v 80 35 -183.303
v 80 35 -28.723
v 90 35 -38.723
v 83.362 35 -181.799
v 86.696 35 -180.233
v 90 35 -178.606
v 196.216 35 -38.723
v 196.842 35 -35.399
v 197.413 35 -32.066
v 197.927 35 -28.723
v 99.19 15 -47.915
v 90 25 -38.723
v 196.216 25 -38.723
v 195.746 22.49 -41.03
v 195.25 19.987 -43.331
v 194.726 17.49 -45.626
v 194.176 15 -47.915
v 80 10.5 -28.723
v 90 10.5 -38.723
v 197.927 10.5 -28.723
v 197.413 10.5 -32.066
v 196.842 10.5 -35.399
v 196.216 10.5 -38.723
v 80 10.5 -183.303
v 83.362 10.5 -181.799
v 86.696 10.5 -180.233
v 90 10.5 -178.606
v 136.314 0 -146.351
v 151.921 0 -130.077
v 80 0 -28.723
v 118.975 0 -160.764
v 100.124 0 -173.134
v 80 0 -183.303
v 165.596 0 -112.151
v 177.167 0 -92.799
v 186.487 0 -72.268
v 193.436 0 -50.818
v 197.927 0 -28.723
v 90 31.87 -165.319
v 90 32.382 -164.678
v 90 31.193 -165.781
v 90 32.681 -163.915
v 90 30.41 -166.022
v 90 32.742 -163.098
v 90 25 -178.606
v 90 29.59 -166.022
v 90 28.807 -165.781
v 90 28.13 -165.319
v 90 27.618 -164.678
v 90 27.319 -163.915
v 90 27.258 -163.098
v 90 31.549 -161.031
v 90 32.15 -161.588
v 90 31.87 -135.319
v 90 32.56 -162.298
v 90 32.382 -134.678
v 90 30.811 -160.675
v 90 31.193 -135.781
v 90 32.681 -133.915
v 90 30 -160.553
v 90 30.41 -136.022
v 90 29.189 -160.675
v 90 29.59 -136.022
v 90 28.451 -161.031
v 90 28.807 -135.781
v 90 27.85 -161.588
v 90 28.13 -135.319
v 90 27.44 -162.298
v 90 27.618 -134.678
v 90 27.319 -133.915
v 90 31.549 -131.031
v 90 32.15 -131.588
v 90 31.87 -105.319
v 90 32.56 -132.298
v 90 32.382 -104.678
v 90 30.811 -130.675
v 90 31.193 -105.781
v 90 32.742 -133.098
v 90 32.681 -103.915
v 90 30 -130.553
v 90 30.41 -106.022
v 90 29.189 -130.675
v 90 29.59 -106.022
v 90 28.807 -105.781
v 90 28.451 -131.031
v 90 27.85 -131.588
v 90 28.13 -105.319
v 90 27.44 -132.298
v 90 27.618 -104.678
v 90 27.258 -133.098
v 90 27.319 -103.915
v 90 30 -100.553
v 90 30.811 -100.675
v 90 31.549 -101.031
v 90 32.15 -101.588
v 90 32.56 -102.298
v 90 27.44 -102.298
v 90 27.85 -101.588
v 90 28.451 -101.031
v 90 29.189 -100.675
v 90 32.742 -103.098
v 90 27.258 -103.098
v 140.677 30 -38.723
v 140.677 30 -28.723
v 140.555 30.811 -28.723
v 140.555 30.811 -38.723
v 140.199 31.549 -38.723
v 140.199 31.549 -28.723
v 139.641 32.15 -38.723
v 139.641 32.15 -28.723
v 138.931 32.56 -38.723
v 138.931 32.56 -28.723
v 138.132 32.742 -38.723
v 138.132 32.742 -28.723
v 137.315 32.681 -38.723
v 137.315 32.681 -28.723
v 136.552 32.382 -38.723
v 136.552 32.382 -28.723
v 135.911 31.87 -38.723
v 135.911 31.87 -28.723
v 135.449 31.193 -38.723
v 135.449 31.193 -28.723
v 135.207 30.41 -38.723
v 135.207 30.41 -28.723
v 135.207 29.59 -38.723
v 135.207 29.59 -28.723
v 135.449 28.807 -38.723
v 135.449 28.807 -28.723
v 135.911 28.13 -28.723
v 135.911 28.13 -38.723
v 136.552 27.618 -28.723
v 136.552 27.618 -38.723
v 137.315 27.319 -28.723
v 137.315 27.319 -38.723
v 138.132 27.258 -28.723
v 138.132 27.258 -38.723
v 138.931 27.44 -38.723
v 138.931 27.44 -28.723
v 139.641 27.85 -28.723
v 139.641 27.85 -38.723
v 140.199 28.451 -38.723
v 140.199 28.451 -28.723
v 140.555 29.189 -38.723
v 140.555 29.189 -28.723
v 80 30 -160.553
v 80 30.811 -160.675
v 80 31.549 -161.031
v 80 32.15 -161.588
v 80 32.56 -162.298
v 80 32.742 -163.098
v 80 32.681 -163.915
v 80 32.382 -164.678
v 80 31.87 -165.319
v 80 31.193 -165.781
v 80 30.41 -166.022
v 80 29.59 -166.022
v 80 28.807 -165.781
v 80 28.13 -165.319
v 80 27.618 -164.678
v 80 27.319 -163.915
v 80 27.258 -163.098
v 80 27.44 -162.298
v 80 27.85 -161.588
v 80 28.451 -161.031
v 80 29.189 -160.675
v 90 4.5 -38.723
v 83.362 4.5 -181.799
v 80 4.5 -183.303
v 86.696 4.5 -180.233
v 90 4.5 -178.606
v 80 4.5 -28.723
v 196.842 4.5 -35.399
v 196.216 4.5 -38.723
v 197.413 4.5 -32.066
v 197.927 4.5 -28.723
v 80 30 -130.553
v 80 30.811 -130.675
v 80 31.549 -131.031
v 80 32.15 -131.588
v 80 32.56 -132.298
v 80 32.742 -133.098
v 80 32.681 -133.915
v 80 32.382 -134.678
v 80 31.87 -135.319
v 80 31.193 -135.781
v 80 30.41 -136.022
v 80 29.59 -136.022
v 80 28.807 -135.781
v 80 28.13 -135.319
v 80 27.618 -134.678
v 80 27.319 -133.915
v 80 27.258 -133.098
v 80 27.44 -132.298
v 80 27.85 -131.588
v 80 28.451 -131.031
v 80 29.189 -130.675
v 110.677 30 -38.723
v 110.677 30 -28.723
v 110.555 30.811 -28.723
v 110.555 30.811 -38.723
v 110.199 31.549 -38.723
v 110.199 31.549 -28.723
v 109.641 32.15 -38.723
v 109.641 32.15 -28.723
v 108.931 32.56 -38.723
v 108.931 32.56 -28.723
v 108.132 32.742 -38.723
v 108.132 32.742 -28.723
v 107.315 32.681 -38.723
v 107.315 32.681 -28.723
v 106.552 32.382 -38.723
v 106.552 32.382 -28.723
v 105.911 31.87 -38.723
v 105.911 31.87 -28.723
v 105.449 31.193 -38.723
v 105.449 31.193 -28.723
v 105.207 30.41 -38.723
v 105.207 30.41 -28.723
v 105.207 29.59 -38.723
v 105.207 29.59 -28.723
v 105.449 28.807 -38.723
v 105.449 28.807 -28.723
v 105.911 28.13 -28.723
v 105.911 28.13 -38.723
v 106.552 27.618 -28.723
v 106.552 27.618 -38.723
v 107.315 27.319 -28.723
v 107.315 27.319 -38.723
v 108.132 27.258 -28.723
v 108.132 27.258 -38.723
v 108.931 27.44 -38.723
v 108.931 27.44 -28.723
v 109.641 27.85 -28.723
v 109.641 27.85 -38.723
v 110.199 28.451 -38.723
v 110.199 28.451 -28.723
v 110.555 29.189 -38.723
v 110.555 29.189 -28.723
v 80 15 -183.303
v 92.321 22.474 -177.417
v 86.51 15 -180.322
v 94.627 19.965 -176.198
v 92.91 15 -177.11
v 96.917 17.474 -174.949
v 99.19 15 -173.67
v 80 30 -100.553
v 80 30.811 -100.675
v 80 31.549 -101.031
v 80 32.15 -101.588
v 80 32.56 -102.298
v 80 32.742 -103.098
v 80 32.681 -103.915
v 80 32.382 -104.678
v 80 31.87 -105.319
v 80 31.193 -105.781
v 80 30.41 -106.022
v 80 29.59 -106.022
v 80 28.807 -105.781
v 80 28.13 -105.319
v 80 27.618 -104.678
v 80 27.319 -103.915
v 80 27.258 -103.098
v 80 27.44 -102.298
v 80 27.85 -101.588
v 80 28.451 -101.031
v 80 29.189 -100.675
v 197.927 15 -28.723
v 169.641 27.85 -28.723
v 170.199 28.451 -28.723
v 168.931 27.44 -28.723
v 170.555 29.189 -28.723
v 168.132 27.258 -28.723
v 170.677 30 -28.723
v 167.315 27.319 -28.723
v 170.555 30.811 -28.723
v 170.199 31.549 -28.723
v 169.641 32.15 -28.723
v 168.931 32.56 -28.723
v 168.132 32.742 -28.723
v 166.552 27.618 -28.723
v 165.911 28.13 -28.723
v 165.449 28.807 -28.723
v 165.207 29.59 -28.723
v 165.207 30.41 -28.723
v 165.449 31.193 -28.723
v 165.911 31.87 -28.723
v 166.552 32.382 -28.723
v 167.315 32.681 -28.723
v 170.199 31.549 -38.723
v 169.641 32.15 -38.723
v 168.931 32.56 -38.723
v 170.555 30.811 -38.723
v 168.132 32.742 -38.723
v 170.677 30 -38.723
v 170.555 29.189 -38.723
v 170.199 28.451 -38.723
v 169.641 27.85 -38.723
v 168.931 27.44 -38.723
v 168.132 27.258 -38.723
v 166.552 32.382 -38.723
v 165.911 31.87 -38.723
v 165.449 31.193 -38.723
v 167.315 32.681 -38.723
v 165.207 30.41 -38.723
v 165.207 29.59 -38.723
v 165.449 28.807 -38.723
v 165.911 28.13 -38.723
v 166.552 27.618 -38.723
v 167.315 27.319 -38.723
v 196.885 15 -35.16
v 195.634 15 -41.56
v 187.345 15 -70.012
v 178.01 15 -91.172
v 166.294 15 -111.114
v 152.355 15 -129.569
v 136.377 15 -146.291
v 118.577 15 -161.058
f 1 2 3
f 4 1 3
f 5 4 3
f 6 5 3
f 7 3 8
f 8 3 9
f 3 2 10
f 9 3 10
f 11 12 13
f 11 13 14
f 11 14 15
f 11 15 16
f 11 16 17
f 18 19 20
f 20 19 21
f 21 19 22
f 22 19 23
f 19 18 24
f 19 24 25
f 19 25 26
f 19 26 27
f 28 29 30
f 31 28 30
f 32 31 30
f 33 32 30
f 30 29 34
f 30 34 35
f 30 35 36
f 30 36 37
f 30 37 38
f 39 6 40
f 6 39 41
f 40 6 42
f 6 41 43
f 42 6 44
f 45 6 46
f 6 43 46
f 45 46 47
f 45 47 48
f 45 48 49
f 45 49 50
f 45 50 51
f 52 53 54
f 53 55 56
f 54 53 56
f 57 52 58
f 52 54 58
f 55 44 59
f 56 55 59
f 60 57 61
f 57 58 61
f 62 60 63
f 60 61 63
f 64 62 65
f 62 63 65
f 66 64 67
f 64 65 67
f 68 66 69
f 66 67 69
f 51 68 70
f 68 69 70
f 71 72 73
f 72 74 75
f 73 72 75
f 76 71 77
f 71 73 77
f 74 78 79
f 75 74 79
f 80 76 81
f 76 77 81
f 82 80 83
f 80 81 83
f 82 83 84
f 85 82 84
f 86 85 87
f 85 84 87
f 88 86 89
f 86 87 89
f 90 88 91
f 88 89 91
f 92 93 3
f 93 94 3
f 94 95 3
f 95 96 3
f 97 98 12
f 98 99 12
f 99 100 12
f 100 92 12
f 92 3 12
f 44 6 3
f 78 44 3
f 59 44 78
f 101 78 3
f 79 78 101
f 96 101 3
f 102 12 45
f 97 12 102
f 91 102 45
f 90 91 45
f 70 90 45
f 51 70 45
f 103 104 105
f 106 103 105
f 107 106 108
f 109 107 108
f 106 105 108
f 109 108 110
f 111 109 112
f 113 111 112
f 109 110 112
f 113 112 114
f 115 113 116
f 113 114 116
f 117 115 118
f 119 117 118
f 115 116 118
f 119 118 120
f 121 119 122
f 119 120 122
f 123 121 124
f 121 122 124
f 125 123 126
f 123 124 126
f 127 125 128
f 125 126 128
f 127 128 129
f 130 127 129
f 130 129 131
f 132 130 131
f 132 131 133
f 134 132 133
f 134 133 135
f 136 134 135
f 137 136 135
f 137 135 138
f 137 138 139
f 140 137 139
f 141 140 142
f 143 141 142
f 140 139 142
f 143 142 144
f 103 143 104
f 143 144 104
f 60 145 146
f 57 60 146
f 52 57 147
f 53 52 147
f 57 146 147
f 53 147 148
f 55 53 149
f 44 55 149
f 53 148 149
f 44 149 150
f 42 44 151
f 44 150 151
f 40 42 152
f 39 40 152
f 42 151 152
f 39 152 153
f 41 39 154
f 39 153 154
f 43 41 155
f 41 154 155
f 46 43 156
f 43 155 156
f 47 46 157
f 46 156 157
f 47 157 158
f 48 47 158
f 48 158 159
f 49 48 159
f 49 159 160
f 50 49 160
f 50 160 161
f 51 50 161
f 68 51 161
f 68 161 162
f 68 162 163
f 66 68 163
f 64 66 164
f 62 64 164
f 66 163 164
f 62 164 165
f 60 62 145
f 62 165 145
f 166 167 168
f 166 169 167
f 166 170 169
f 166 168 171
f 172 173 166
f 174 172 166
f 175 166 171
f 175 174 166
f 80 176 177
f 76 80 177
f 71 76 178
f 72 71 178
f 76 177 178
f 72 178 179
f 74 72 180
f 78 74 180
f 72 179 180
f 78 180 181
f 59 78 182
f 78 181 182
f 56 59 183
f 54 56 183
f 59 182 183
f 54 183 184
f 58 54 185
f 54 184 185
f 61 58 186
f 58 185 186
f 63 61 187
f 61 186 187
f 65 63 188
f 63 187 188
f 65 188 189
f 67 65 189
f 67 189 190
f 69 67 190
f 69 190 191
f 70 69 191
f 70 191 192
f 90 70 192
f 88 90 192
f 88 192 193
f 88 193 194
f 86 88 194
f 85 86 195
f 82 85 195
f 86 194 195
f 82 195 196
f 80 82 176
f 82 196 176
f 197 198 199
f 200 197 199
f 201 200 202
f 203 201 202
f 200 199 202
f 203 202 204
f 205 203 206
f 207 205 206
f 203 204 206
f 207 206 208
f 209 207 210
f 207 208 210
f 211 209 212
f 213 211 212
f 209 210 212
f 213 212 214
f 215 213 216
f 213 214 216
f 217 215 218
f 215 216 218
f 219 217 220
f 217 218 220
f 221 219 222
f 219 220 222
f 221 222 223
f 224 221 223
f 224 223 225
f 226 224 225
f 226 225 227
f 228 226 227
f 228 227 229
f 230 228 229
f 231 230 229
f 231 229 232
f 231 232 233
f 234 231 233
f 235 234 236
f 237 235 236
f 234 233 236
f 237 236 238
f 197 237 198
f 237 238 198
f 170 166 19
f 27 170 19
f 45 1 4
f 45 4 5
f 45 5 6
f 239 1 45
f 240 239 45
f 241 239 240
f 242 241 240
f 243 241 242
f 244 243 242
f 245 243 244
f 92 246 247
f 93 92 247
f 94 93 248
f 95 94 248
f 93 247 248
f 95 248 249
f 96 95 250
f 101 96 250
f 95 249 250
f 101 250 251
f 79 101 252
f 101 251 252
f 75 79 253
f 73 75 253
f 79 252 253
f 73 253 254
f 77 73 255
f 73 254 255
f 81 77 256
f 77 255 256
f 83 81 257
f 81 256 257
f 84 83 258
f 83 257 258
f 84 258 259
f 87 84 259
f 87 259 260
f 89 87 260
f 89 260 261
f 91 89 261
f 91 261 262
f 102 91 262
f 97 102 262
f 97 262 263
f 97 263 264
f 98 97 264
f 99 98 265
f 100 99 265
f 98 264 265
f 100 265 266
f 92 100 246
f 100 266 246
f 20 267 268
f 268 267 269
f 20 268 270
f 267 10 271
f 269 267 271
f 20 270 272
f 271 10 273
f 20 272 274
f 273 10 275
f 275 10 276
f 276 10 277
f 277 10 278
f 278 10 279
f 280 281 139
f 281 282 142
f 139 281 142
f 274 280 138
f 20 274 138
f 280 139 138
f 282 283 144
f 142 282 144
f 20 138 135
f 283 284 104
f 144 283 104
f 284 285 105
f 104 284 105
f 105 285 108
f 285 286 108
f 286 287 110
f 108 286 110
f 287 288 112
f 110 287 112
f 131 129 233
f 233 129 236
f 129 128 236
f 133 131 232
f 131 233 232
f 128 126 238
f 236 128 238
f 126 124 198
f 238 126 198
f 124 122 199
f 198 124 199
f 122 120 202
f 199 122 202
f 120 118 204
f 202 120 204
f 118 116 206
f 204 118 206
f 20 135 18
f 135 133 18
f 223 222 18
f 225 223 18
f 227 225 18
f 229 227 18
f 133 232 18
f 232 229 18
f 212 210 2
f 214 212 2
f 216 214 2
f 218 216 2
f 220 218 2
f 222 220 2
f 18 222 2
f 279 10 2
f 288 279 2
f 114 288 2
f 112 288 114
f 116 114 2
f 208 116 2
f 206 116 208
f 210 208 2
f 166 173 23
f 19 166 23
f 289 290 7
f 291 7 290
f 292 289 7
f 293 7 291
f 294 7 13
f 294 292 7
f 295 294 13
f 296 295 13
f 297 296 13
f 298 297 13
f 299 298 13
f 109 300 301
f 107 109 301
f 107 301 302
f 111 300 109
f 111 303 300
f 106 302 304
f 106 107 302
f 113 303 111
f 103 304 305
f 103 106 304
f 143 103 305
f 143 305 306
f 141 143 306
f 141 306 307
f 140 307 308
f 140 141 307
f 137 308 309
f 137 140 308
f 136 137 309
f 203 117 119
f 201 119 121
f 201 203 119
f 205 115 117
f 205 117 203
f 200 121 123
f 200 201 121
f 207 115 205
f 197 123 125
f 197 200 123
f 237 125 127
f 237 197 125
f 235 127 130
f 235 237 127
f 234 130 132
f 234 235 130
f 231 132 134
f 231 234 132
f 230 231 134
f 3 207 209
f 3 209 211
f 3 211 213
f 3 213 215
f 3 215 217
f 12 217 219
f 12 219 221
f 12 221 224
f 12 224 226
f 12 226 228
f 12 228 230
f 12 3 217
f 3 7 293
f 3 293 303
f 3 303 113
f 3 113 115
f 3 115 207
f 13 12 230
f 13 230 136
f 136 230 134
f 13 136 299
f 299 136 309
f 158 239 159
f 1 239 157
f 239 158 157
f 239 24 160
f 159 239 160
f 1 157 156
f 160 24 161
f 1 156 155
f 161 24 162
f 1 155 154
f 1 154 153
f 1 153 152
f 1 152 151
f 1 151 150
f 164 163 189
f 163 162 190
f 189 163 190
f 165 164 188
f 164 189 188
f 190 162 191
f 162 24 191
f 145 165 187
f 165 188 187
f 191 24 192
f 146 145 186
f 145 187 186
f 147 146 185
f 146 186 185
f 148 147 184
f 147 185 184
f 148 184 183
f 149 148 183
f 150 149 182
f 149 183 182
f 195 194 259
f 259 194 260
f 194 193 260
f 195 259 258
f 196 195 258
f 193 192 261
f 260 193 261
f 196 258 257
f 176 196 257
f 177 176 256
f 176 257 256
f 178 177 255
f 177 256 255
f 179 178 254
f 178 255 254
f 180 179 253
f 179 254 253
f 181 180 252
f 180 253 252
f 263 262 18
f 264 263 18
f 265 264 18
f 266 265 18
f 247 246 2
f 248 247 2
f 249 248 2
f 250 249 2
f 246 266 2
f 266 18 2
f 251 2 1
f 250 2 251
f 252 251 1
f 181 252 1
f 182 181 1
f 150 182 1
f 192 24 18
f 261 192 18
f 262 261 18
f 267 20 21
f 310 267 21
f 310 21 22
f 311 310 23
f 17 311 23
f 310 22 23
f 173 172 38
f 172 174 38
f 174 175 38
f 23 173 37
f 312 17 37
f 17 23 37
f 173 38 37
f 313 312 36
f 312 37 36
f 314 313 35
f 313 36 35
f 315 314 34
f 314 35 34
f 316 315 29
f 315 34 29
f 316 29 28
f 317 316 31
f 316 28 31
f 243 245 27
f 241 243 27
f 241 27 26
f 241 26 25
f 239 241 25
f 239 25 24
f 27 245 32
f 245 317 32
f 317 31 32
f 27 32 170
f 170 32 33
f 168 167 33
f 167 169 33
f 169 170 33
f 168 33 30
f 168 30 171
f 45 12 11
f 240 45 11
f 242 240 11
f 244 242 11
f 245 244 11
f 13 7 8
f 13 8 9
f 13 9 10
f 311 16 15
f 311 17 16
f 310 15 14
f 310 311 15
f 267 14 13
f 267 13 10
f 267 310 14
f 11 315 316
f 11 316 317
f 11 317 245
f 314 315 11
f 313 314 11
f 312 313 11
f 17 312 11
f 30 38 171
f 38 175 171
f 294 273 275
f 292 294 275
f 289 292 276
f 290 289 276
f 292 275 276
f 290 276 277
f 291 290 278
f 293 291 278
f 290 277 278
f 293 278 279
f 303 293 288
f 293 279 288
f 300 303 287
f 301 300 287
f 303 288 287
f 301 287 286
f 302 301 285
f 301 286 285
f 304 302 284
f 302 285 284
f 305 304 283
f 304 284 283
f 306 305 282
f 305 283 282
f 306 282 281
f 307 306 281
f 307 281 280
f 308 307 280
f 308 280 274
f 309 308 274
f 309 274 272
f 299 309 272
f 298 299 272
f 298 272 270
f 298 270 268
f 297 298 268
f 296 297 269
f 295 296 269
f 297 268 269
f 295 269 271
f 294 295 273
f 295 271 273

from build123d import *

# Parameters (mm, degrees)
SKETCH1_R                = 200
BOSS_EXTRUDE1_DEPTH      = 15
BOSS_EXTRUDE2_DEPTH      = 200
CUT_EXTRUDE1_DEPTH       = 286.087705803
CUT_EXTRUDE1_DEPTH_BACK  = 286.087705803
SKETCH3_R                = 85
CUT_EXTRUDE2_DEPTH       = 451.079120005
CUT_EXTRUDE2_DEPTH_BACK  = 451.079120005
SKETCH4_R                = 11
CUT_EXTRUDE3_DEPTH       = 451.079120105
CUT_EXTRUDE3_DEPTH_BACK  = 110
CUT_EXTRUDE4_DEPTH       = 110
BOSS_EXTRUDE3_DEPTH      = 200
CUT_EXTRUDE5_DEPTH       = 286.087705815
CUT_EXTRUDE5_DEPTH_BACK  = 286.087705815
SKETCH7_OUTSIDE_W        = 515.59
SKETCH7_OUTSIDE_H        = 515.59
SKETCH7_OUTSIDE_R        = 200
SKETCH9_R                = 4
BOSS_EXTRUDE4_DEPTH      = 220
CUT_EXTRUDE6_DEPTH       = 190
SKETCH11_R               = 3
CUT_EXTRUDE7_DEPTH       = 486.974499745
CUT_EXTRUDE8_DEPTH       = 300.457843596
CUT_EXTRUDE8_DEPTH_BACK  = 300.457843596
SKETCH12_OUTSIDE_W       = 561.36
SKETCH12_OUTSIDE_H       = 521.36
BOSS_EXTRUDE5_DEPTH      = 160
BOSS_EXTRUDE6_DEPTH      = 160
CUT_EXTRUDE9_START       = 15
CUT_EXTRUDE9_DEPTH       = 20
CUT_EXTRUDE10_DEPTH      = 254.564671702
CUT_EXTRUDE10_DEPTH_BACK = 254.564671702
SKETCH17_W               = 10
SKETCH17_H               = 6
CUT_EXTRUDE11_DEPTH      = 221.752620232
CUT_EXTRUDE11_DEPTH_BACK = 221.752620232
SKETCH18_W               = 10
SKETCH18_H               = 6
SKETCH19_R               = 2.75
CUT_EXTRUDE12_DEPTH      = 10
SKETCH20_R               = 2.75
CUT_EXTRUDE13_DEPTH      = 10


# Read off the part's stored shape, not the designer's step: Cut-Extrude9
with BuildPart() as part:
    # Sketch1 → Boss-Extrude1 (new body)
    with BuildSketch(Plane(origin=(0, 0, 0), x_dir=(1, 0, 0), z_dir=(0, 1, 0))):
        with Locations(Location((0, 0, 0), (0, 0, 270))):
            Circle(SKETCH1_R)
    extrude(amount=BOSS_EXTRUDE1_DEPTH)

    # Sketch2 → Boss-Extrude2 (add, symmetric)
    with BuildSketch(Plane.XY):
        Polygon((-25, 50.707142143), (25, 50.707142143), (60, 15), (-60, 15), align=None)
    extrude(amount=BOSS_EXTRUDE2_DEPTH, both=True)

    # Sketch3 → Cut-Extrude1 (cut, two sides: drawn at the far end of the back side and taken through both)
    with BuildSketch(Plane(origin=(0, 15, 0), x_dir=(1, 0, 0), z_dir=(0, 1, 0)).offset(-CUT_EXTRUDE1_DEPTH_BACK)):
        with Locations(Location((0, 0, 0), (0, 0, 270))):
            Circle(SKETCH3_R)
    extrude(amount=CUT_EXTRUDE1_DEPTH + CUT_EXTRUDE1_DEPTH_BACK, mode=Mode.SUBTRACT)

    # Sketch4 → Cut-Extrude2 (cut, two sides: drawn at the far end of the back side and taken through both)
    with BuildSketch(Plane(origin=(0, 0, -200), x_dir=(-1, 0, 0), z_dir=(0, 0, -1)).offset(-CUT_EXTRUDE2_DEPTH_BACK)):
        with Locations((0, 29)):
            Circle(SKETCH4_R)
    extrude(amount=CUT_EXTRUDE2_DEPTH + CUT_EXTRUDE2_DEPTH_BACK, mode=Mode.SUBTRACT)

    # Sketch5 → Cut-Extrude3 (cut, two sides: drawn at the far end of the back side and taken through both)
    with BuildSketch(Plane.XY.offset(200).offset(-CUT_EXTRUDE3_DEPTH_BACK)):
        Polygon((-25, 50.707142143), (25, 50.707142143), (50.198039412, 25), (25, 25), (25, 15), (-25, 15), (-25, 25), (-50.198039412, 25), align=None)
    extrude(amount=CUT_EXTRUDE3_DEPTH + CUT_EXTRUDE3_DEPTH_BACK, mode=Mode.SUBTRACT)

    # Sketch6 → Cut-Extrude4 (cut)
    with BuildSketch(Plane(origin=(0, 0, -200), x_dir=(-1, 0, 0), z_dir=(0, 0, -1))):
        Polygon((-25, 50.707142143), (25, 50.707142143), (50.198039412, 25), (25, 25), (25, 15), (-25, 15), (-25, 25), (-50.198039412, 25), align=None)
    extrude(amount=-CUT_EXTRUDE4_DEPTH, mode=Mode.SUBTRACT)

    # Sketch8 → Boss-Extrude3 (add, symmetric)
    with BuildSketch(Plane(origin=(0, 0, 0), x_dir=(0, 0, -1), z_dir=(1, 0, 0))):
        Polygon((0, 15), (-20, 15), (-10, 35.712315177), (10, 35.712315177), (20, 15), align=None)
    extrude(amount=BOSS_EXTRUDE3_DEPTH, both=True)

    # Sketch7 outside → Cut-Extrude5 (cut, two sides: drawn at the far end of the back side and taken through both)
    with BuildSketch(Plane(origin=(0, 15, 0), x_dir=(1, 0, 0), z_dir=(0, 1, 0)).offset(-CUT_EXTRUDE5_DEPTH_BACK)):
        Rectangle(SKETCH7_OUTSIDE_W, SKETCH7_OUTSIDE_H)
        with Locations(Location((0, 0, 0), (0, 0, 97.180755781))):
            Circle(SKETCH7_OUTSIDE_R, mode=Mode.SUBTRACT)
    extrude(amount=CUT_EXTRUDE5_DEPTH + CUT_EXTRUDE5_DEPTH_BACK, mode=Mode.SUBTRACT)

    # Sketch9 → Boss-Extrude4 (add, symmetric)
    with BuildSketch(Plane(origin=(0, 0, 0), x_dir=(0, 0, -1), z_dir=(1, 0, 0))):
        with Locations(Location((0, 29, 0), (0, 0, 180))):
            Circle(SKETCH9_R)
    extrude(amount=BOSS_EXTRUDE4_DEPTH, both=True)

    # Sketch10 → Cut-Extrude6 (cut, symmetric)
    with BuildSketch(Plane(origin=(0, 0, 0), x_dir=(0, 0, -1), z_dir=(1, 0, 0))):
        Polygon((-20, 15), (20, 15), (10, 35.712315177), (-10, 35.712315177), align=None)
    extrude(amount=CUT_EXTRUDE6_DEPTH, both=True, mode=Mode.SUBTRACT)

    # Sketch11 → Cut-Extrude7 (cut, through all)
    with BuildSketch(Plane.ZY.offset(220)):
        with Locations((0, 29)):
            Circle(SKETCH11_R)
    extrude(amount=-CUT_EXTRUDE7_DEPTH, mode=Mode.SUBTRACT)

    # Sketch12 outside → Cut-Extrude8 (cut, two sides: drawn at the far end of the back side and taken through both)
    with BuildSketch(Plane(origin=(0, 15, 0), x_dir=(1, 0, 0), z_dir=(0, 1, 0)).offset(-CUT_EXTRUDE8_DEPTH_BACK)):
        Rectangle(SKETCH12_OUTSIDE_W, SKETCH12_OUTSIDE_H)
        Polygon((80, 28.722813233), (80, 205.18025718), (287.401401401, 28.722813233), align=None, mode=Mode.SUBTRACT)
    extrude(amount=CUT_EXTRUDE8_DEPTH + CUT_EXTRUDE8_DEPTH_BACK, mode=Mode.SUBTRACT)

    # Sketch13 → Boss-Extrude5 (add)
    with BuildSketch(Plane.XY.offset(-28.722813233)):
        Polygon((80, 15), (80, 35), (90, 35), (90, 25), (99.19, 15), align=None)
    extrude(amount=-BOSS_EXTRUDE5_DEPTH)

    # Sketch15 → Boss-Extrude6 (add)
    with BuildSketch(Plane(origin=(90, 0, 0), x_dir=(0, 0, -1), z_dir=(1, 0, 0))):
        Polygon((28.722813233, 15), (28.722813233, 35), (38.722813233, 35), (38.722813233, 25), (47.915201388, 15), align=None)
    extrude(amount=BOSS_EXTRUDE6_DEPTH)

    # Cut-Extrude9 outline → Cut-Extrude9 (cut)
    with BuildSketch(Plane(origin=(0, 0, 0), x_dir=(1, 0, 0), z_dir=(0, 1, 0)).offset(CUT_EXTRUDE9_START)):
        with BuildLine():
            Line((78, 184.175899359), (80, 183.303027798))
            ThreePointArc((80, 183.303027798), (159.011260133, 121.307127371), (197.926754129, 28.722813233))
            Line((197.926754129, 28.722813233), (250, 28.722813233))
            Line((250, 28.722813233), (250, 188.722813233))
            Line((250, 188.722813233), (78, 188.722813233))
            Line((78, 188.722813233), (78, 184.175899359))
        make_face()
    extrude(amount=CUT_EXTRUDE9_DEPTH, mode=Mode.SUBTRACT)

    # Sketch17 → Cut-Extrude10 (cut, two sides: drawn at the far end of the back side and taken through both)
    with BuildSketch(Plane.XY.offset(-28.722813233).offset(-CUT_EXTRUDE10_DEPTH_BACK)):
        with Locations((85, 7.5)):
            Rectangle(SKETCH17_W, SKETCH17_H)
    extrude(amount=CUT_EXTRUDE10_DEPTH + CUT_EXTRUDE10_DEPTH_BACK, mode=Mode.SUBTRACT)

    # Sketch18 → Cut-Extrude11 (cut, two sides: drawn at the far end of the back side and taken through both)
    with BuildSketch(Plane.ZY.offset(-80).offset(-CUT_EXTRUDE11_DEPTH_BACK)):
        with Locations((-33.722813233, 7.5)):
            Rectangle(SKETCH18_W, SKETCH18_H)
    extrude(amount=CUT_EXTRUDE11_DEPTH + CUT_EXTRUDE11_DEPTH_BACK, mode=Mode.SUBTRACT)

    # Sketch19 → Cut-Extrude12 (cut)
    with BuildSketch(Plane.XY.offset(-28.722813233)):
        with Locations((107.926754129, 30)):
            Circle(SKETCH19_R)
        with Locations((167.926754129, 30)):
            Circle(SKETCH19_R)
        with Locations((137.926754129, 30)):
            Circle(SKETCH19_R)
    extrude(amount=-CUT_EXTRUDE12_DEPTH, mode=Mode.SUBTRACT)

    # Sketch20 → Cut-Extrude13 (cut)
    with BuildSketch(Plane.ZY.offset(-80)):
        with Locations((-163.303027798, 30)):
            Circle(SKETCH20_R)
        with Locations((-133.303027798, 30)):
            Circle(SKETCH20_R)
        with Locations((-103.303027798, 30)):
            Circle(SKETCH20_R)
    extrude(amount=-CUT_EXTRUDE13_DEPTH, mode=Mode.SUBTRACT)


solid = part.part
